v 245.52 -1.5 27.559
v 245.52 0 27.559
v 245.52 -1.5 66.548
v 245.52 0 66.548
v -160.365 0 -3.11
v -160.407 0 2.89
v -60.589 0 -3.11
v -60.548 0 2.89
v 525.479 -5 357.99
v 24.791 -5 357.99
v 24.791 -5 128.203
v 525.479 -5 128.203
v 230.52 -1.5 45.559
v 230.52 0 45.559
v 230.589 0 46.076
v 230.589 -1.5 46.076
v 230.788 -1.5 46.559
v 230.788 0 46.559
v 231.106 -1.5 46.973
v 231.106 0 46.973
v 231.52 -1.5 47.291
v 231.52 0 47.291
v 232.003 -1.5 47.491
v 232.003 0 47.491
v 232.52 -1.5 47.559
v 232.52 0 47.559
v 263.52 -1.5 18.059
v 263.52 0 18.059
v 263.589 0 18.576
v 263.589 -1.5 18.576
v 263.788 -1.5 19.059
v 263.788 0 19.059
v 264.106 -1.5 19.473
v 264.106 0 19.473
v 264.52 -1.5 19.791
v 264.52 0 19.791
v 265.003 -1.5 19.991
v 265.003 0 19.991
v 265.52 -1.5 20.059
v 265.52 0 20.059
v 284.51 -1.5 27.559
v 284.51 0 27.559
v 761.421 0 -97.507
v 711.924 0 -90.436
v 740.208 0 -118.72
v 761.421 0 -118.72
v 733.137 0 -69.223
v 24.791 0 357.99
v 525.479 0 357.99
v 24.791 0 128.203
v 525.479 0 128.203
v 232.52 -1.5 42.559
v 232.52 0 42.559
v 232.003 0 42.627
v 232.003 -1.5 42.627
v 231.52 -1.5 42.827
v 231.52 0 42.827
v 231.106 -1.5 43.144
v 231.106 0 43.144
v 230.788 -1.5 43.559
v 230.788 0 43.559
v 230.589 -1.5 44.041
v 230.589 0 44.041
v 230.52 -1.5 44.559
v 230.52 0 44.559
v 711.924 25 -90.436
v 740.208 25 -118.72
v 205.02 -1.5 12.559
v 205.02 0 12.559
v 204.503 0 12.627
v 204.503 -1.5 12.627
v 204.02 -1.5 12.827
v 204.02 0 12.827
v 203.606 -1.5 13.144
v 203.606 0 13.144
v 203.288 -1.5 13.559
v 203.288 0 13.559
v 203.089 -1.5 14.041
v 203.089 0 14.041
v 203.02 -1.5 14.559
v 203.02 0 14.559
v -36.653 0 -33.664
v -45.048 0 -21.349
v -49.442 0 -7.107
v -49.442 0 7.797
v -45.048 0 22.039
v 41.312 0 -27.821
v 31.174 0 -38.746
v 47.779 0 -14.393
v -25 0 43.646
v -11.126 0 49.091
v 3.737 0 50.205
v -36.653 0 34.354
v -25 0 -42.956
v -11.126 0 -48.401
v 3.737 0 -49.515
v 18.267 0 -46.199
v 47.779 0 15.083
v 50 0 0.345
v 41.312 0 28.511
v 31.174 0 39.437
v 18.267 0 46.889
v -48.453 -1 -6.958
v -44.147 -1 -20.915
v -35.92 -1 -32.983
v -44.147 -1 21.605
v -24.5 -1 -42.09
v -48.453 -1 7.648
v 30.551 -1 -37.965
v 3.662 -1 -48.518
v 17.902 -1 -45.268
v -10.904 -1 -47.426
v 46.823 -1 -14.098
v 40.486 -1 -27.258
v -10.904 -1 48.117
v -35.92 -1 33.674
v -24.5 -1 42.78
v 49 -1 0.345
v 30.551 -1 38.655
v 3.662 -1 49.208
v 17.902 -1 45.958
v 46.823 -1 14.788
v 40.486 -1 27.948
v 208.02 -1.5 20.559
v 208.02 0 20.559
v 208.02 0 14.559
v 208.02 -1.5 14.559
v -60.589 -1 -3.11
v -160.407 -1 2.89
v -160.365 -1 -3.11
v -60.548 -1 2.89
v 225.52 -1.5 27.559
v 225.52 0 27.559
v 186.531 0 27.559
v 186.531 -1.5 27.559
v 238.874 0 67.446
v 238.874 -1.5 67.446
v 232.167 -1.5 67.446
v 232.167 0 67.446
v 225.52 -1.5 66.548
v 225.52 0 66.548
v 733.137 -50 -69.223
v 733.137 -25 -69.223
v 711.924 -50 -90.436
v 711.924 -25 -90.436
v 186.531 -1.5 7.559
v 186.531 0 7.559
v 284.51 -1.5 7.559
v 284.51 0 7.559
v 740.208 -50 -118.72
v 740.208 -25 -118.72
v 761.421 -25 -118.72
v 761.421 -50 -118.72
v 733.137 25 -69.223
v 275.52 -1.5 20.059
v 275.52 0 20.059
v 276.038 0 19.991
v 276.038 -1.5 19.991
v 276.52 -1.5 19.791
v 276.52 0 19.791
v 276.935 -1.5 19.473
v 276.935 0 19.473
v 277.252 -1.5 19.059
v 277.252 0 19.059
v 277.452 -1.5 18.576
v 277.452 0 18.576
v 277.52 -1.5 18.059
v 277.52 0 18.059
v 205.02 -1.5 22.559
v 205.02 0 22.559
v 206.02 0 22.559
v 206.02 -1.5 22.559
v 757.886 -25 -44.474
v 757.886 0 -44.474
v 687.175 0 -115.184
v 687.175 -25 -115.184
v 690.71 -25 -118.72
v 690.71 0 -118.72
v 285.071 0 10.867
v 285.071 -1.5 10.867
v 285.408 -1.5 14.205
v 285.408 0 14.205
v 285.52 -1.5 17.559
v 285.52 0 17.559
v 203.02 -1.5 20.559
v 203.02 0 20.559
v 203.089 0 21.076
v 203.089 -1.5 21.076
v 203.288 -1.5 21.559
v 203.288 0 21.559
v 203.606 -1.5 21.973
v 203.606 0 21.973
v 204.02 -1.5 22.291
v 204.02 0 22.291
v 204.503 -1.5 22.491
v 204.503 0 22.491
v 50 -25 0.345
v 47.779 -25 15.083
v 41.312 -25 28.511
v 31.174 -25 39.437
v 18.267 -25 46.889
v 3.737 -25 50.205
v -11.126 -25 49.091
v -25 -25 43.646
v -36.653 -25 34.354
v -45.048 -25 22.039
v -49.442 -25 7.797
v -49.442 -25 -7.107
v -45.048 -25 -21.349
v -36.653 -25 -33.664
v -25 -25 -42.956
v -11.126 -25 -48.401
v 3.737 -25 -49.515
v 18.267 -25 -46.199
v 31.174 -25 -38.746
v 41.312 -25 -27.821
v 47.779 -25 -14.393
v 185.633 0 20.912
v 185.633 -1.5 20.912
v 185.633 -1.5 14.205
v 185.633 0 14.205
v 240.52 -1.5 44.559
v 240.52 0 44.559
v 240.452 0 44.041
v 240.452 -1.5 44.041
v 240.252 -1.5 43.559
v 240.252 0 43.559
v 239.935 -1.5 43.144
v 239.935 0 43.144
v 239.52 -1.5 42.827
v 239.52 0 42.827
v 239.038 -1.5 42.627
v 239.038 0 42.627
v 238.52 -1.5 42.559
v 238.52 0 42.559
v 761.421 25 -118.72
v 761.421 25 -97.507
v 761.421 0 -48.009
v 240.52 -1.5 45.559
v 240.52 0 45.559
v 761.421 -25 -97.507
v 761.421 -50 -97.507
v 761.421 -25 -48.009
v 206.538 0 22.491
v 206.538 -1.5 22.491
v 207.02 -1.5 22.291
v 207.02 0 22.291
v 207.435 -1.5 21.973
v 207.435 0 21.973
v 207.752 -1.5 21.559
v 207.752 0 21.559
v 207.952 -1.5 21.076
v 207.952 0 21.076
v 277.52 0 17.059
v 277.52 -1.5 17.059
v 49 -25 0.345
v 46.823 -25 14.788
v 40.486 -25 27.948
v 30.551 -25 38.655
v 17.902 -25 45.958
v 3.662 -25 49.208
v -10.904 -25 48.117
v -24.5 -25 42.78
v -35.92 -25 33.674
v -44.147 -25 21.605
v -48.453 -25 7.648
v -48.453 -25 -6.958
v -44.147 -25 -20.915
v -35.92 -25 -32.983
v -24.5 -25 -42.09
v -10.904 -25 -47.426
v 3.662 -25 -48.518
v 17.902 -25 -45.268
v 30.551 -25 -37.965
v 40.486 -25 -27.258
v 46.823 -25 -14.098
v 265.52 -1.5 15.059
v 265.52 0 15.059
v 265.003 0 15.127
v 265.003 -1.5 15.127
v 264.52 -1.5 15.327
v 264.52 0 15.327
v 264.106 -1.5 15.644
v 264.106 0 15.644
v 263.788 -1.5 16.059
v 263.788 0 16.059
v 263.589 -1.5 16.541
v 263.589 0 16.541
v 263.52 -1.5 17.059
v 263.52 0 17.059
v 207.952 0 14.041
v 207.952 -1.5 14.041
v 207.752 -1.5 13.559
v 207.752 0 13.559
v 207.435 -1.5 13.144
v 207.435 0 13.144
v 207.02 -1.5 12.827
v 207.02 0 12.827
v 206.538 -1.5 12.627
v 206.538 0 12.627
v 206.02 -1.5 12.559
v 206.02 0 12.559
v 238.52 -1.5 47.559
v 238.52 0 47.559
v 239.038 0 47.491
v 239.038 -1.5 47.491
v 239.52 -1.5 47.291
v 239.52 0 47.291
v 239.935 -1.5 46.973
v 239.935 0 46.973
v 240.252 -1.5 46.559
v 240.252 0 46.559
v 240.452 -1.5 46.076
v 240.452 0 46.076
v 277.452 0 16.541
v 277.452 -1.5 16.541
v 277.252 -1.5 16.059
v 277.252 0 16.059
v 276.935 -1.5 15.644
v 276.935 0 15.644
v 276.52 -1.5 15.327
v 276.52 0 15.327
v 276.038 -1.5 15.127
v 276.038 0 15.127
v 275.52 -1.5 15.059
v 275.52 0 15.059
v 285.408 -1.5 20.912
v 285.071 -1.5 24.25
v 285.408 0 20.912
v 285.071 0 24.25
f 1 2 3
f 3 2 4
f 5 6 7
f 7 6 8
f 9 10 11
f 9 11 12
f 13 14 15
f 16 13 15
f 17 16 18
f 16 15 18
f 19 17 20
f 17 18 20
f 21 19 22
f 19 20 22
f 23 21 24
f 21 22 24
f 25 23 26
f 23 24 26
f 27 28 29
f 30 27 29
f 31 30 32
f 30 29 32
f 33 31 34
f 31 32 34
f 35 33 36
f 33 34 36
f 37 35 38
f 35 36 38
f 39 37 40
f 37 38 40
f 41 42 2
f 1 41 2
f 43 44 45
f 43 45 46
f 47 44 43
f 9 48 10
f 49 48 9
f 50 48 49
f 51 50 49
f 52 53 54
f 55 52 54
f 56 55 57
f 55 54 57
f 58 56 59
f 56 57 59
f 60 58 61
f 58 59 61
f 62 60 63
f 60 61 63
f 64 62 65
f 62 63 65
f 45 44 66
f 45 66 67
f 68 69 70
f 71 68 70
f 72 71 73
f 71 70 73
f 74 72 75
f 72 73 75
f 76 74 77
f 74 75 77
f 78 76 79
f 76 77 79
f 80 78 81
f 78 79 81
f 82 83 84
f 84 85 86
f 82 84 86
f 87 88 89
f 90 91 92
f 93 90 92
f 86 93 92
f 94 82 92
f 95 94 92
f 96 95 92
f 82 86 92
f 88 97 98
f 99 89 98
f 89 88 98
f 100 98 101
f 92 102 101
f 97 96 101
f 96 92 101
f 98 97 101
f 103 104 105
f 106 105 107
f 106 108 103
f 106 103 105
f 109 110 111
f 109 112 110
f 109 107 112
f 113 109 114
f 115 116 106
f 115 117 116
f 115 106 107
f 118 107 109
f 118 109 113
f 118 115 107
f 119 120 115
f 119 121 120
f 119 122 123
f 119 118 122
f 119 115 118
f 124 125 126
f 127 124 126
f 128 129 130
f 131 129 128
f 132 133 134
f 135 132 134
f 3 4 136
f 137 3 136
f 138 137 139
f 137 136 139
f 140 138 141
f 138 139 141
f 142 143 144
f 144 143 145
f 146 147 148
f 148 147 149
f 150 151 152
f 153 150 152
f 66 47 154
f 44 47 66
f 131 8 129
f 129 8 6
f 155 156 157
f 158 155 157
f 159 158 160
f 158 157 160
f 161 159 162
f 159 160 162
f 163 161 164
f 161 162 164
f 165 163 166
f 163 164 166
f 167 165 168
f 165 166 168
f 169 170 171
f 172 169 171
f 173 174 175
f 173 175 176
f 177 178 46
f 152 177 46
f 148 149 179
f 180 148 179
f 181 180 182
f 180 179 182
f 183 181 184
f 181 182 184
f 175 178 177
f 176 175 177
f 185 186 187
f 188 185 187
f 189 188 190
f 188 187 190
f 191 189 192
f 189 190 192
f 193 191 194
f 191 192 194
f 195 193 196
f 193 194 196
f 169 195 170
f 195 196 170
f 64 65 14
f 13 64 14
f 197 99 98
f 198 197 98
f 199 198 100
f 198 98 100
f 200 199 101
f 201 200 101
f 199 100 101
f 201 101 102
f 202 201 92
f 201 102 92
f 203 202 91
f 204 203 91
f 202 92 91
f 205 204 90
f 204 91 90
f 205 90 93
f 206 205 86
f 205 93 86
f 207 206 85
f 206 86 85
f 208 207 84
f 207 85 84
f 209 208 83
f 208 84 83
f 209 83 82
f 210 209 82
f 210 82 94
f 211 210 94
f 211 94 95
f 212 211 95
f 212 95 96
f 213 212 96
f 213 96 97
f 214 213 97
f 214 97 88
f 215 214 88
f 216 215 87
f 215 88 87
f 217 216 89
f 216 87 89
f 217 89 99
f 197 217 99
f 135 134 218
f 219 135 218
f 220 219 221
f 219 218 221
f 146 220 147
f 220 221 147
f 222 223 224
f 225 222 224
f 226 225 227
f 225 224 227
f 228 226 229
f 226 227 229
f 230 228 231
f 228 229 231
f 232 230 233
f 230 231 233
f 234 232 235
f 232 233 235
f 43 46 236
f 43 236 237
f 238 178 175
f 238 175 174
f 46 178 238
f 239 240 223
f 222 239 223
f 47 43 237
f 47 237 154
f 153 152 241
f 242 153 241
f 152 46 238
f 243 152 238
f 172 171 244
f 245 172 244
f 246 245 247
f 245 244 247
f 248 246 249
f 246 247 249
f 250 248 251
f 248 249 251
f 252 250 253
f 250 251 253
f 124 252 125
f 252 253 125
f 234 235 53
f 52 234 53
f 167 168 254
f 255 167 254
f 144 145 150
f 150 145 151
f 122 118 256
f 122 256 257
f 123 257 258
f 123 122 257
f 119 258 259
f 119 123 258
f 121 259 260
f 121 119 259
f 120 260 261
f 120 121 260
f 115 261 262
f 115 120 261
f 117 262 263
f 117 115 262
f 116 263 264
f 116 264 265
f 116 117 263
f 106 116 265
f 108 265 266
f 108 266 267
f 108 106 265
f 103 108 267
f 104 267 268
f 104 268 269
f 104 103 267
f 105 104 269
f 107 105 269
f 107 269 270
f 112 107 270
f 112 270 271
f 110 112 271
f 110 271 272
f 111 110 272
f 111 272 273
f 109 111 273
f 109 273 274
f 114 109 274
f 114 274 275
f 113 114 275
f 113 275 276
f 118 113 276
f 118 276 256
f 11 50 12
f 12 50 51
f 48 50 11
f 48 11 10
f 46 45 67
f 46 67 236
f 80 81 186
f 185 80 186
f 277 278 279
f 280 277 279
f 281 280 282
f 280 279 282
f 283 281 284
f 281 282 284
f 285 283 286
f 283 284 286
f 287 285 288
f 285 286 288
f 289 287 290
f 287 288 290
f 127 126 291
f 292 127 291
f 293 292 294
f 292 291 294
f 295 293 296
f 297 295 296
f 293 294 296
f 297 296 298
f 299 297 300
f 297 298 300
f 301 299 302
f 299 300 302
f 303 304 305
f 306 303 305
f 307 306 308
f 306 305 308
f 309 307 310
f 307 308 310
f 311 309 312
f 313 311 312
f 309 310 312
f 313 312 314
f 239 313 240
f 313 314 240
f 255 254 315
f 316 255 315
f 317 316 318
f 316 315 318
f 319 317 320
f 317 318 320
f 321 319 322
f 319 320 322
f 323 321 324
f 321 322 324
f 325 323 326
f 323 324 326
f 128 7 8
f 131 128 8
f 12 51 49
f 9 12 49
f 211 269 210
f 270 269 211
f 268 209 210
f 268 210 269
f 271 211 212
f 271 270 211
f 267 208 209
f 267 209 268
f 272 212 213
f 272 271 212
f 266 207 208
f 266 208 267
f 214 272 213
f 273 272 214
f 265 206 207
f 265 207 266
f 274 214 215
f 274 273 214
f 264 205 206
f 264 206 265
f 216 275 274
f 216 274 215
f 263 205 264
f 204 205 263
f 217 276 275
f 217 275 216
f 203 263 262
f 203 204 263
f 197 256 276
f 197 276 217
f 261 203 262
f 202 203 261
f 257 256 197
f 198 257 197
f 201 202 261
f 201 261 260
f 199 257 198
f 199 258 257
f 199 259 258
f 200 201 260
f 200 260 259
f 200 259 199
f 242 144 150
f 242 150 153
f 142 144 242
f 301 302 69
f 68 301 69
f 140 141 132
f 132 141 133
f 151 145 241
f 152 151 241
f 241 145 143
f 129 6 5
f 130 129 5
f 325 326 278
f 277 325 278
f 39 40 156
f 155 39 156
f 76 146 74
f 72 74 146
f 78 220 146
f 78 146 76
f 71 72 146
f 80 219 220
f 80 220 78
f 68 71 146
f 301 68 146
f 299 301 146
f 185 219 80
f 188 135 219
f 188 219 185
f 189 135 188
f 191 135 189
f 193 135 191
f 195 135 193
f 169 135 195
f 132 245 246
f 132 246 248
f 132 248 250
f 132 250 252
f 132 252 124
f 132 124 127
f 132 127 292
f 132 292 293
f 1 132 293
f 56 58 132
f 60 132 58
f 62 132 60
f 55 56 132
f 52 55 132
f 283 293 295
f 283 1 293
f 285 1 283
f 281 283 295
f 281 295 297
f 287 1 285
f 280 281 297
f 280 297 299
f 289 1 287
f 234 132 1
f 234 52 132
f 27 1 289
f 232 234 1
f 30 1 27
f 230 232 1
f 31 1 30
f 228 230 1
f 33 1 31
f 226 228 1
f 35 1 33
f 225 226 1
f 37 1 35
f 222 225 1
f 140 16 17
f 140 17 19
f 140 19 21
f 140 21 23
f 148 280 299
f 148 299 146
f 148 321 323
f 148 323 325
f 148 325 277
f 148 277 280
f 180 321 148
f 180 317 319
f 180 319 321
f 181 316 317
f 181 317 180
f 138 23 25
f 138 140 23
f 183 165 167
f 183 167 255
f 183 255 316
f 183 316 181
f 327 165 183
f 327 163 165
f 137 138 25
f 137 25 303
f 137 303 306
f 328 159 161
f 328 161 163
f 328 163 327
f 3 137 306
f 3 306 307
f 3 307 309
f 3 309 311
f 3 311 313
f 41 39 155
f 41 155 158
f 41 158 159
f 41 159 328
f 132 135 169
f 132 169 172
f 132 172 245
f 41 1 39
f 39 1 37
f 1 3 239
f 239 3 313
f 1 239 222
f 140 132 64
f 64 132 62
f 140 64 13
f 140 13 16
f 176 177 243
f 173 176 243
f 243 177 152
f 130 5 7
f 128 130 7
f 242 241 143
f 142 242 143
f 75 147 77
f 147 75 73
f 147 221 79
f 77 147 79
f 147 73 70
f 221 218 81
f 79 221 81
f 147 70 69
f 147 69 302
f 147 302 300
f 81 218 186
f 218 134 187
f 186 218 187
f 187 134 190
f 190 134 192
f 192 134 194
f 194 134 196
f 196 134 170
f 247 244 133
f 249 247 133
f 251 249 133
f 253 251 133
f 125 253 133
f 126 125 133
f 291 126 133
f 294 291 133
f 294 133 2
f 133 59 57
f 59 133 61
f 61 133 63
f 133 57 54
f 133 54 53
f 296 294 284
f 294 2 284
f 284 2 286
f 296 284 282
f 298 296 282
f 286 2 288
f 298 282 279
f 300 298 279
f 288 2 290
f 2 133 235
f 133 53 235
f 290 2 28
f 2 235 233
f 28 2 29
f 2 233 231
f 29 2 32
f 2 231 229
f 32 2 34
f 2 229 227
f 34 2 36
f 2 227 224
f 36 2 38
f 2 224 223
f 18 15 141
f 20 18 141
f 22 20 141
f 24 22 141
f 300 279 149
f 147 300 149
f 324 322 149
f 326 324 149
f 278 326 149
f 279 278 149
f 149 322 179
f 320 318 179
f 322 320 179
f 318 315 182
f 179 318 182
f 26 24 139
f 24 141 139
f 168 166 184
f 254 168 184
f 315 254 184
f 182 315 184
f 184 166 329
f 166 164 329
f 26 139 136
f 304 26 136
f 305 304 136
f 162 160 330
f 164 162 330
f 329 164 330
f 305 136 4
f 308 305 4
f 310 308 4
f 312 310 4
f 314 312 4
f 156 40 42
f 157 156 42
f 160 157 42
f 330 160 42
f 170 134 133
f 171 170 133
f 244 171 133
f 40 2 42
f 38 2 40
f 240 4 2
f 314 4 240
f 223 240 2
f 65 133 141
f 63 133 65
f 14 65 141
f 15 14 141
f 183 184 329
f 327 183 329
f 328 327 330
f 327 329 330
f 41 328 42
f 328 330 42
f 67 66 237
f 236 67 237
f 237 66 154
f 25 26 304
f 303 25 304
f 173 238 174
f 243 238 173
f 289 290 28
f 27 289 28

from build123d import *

# Parameters (mm, degrees)
F0_R      = 50
F1_DEPTH  = 25
F2_T      = -1
F3_DEPTH  = 1
F5_DEPTH  = 1.5
F4_W      = 500.6877612323
F4_H      = 229.7869026661
F7_DEPTH  = 5
F8_DEPTH  = 25
F9_W      = 25
F9_H      = 100
F11_DEPTH = 5
F13_DEPTH = 25
F15_DEPTH = 25


# Not quite as in the source:
# - the program builds the solid bodies; features that only make, move or delete a surface that nothing else refers to are left out


with BuildPart() as f1:
    # F0 (on Front) → F1 (new body)
    with BuildSketch(Plane.XZ):
        with Locations((-2.272e-07, 0.3450742583)):
            Circle(F0_R)
    extrude(amount=F1_DEPTH)

    # F2
    f2_openings = [f1.faces().sort_by_distance(p)[0] for p in [
        (0, -25, 0.345074),
    ]]
    offset(amount=F2_T, openings=f2_openings)


with BuildPart() as f3:
    # F0 (on Front) → F3 (new body)
    with BuildSketch(Plane.XZ):
        Polygon((-60.5894945183, -3.1098189969), (-60.5480098743, 2.8901810031), (-160.4069377537, 2.8901810031), (-160.3654531097, -3.1098189969), align=None)
    extrude(amount=F3_DEPTH)


with BuildPart() as f5:
    # F4 (on Front) → F5 (new body)
    with BuildSketch(Plane.XZ):
        with BuildLine():
            Line((225.5204433411, 27.5586571583), (186.5306484854, 27.5586571583))
            ThreePointArc((186.5306484854, 27.5586571583), (185.5204433411, 17.5586571583), (186.5306484854, 7.5586571583))
            Line((186.5306484854, 7.5586571583), (284.5102381967, 7.5586571583))
            ThreePointArc((284.5102381967, 7.5586571583), (285.2672509913, 12.533209058), (285.5204433411, 17.5586571583))
            ThreePointArc((285.5204433411, 17.5586571583), (285.2672509913, 22.5841052585), (284.5102381967, 27.5586571583))
            Line((284.5102381967, 27.5586571583), (245.5204433411, 27.5586571583))
            Line((245.5204433411, 27.5586571583), (245.5204433411, 66.5484520139))
            ThreePointArc((245.5204433411, 66.5484520139), (235.5204433411, 67.5586571583), (225.5204433411, 66.5484520139))
            Line((225.5204433411, 66.5484520139), (225.5204433411, 27.5586571583))
        make_face()
        with BuildLine():
            ThreePointArc((203.0204433411, 20.5586571583), (203.6062297787, 21.9728707206), (205.0204433411, 22.5586571583))
            Line((205.0204433411, 22.5586571583), (205.5204433411, 22.5586571583))
            Line((205.5204433411, 22.5586571583), (206.0204433411, 22.5586571583))
            ThreePointArc((206.0204433411, 22.5586571583), (207.4346569034, 21.9728707206), (208.0204433411, 20.5586571583))
            Line((208.0204433411, 20.5586571583), (208.0204433411, 14.5586571583))
            ThreePointArc((208.0204433411, 14.5586571583), (207.4346569034, 13.1444435959), (206.0204433411, 12.5586571583))
            Line((206.0204433411, 12.5586571583), (205.5204433411, 12.5586571583))
            Line((205.5204433411, 12.5586571583), (205.0204433411, 12.5586571583))
            ThreePointArc((205.0204433411, 12.5586571583), (203.6062297787, 13.1444435959), (203.0204433411, 14.5586571583))
            Line((203.0204433411, 14.5586571583), (203.0204433411, 20.5586571583))
        make_face(mode=Mode.SUBTRACT)
        with BuildLine():
            ThreePointArc((275.5204433411, 20.0586571583), (276.9346569034, 19.4728707206), (277.5204433411, 18.0586571583))
            Line((277.5204433411, 18.0586571583), (277.5204433411, 17.5586571583))
            Line((277.5204433411, 17.5586571583), (277.5204433411, 17.0586571583))
            ThreePointArc((277.5204433411, 17.0586571583), (276.9346569034, 15.6444435959), (275.5204433411, 15.0586571583))
            Line((275.5204433411, 15.0586571583), (265.5204433411, 15.0586571583))
            ThreePointArc((265.5204433411, 15.0586571583), (264.1062297787, 15.6444435959), (263.5204433411, 17.0586571583))
            Line((263.5204433411, 17.0586571583), (263.5204433411, 17.5586571583))
            Line((263.5204433411, 17.5586571583), (263.5204433411, 18.0586571583))
            ThreePointArc((263.5204433411, 18.0586571583), (264.1062297787, 19.4728707206), (265.5204433411, 20.0586571583))
            Line((265.5204433411, 20.0586571583), (275.5204433411, 20.0586571583))
        make_face(mode=Mode.SUBTRACT)
        with BuildLine():
            Line((232.5204433411, 47.5586571583), (238.5204433411, 47.5586571583))
            ThreePointArc((238.5204433411, 47.5586571583), (239.9346569034, 46.9728707206), (240.5204433411, 45.5586571583))
            Line((240.5204433411, 45.5586571583), (240.5204433411, 45.0586571583))
            Line((240.5204433411, 45.0586571583), (240.5204433411, 44.5586571583))
            ThreePointArc((240.5204433411, 44.5586571583), (239.9346569034, 43.1444435959), (238.5204433411, 42.5586571583))
            Line((238.5204433411, 42.5586571583), (232.5204433411, 42.5586571583))
            ThreePointArc((232.5204433411, 42.5586571583), (231.1062297787, 43.1444435959), (230.5204433411, 44.5586571583))
            Line((230.5204433411, 44.5586571583), (230.5204433411, 45.0586571583))
            Line((230.5204433411, 45.0586571583), (230.5204433411, 45.5586571583))
            ThreePointArc((230.5204433411, 45.5586571583), (231.1062297787, 46.9728707206), (232.5204433411, 47.5586571583))
        make_face(mode=Mode.SUBTRACT)
    extrude(amount=F5_DEPTH)


with BuildPart() as f7:
    # F4 (on Front) → F7 (new body)
    with BuildSketch(Plane.XZ):
        with Locations((275.1347804442, 243.0963665247)):
            Rectangle(F4_W, F4_H)
    extrude(amount=F7_DEPTH)


with BuildPart() as f8:
    # F4 (on Front) → F8 (new body)
    with BuildSketch(Plane.XZ):
        Polygon((761.4211719814, -118.7199804553), (761.4211719814, -48.0093023367), (690.7104938628, -118.7199804553), align=None)
    extrude(amount=F8_DEPTH)

    # F9 (on face) → F11 (join)
    with BuildSketch(Plane(origin=(404.7152371591, 0, -404.7152371591), x_dir=(0, -1, 0), z_dir=(-0.7071067812, 0, 0.7071067812))):
        with Locations((12.5, 454.4583708048)):
            Rectangle(F9_W, F9_H)
    extrude(amount=F11_DEPTH)


with BuildPart() as f13:
    # F12 (on Front) → F13 (new body)
    with BuildSketch(Plane.XZ):
        Polygon((761.4211719814, -118.7199804553), (761.4211719814, -97.5067770197), (733.136900734, -69.2225057723), (711.9236972984, -90.4357092079), (740.2079685458, -118.7199804553), align=None)
    extrude(amount=-F13_DEPTH)


with BuildPart() as f15:
    # F14 (on face) → F15 (new body)
    with BuildSketch(Plane.XZ.offset(25)):
        Polygon((761.4211719814, -118.7199804553), (761.4211719814, -97.5067770197), (733.136900734, -69.2225057723), (711.9236972984, -90.4357092079), (740.2079685458, -118.7199804553), align=None)
    extrude(amount=F15_DEPTH)


solid = Compound([f1.part, f3.part, f5.part, f7.part, f8.part, f13.part, f15.part])
